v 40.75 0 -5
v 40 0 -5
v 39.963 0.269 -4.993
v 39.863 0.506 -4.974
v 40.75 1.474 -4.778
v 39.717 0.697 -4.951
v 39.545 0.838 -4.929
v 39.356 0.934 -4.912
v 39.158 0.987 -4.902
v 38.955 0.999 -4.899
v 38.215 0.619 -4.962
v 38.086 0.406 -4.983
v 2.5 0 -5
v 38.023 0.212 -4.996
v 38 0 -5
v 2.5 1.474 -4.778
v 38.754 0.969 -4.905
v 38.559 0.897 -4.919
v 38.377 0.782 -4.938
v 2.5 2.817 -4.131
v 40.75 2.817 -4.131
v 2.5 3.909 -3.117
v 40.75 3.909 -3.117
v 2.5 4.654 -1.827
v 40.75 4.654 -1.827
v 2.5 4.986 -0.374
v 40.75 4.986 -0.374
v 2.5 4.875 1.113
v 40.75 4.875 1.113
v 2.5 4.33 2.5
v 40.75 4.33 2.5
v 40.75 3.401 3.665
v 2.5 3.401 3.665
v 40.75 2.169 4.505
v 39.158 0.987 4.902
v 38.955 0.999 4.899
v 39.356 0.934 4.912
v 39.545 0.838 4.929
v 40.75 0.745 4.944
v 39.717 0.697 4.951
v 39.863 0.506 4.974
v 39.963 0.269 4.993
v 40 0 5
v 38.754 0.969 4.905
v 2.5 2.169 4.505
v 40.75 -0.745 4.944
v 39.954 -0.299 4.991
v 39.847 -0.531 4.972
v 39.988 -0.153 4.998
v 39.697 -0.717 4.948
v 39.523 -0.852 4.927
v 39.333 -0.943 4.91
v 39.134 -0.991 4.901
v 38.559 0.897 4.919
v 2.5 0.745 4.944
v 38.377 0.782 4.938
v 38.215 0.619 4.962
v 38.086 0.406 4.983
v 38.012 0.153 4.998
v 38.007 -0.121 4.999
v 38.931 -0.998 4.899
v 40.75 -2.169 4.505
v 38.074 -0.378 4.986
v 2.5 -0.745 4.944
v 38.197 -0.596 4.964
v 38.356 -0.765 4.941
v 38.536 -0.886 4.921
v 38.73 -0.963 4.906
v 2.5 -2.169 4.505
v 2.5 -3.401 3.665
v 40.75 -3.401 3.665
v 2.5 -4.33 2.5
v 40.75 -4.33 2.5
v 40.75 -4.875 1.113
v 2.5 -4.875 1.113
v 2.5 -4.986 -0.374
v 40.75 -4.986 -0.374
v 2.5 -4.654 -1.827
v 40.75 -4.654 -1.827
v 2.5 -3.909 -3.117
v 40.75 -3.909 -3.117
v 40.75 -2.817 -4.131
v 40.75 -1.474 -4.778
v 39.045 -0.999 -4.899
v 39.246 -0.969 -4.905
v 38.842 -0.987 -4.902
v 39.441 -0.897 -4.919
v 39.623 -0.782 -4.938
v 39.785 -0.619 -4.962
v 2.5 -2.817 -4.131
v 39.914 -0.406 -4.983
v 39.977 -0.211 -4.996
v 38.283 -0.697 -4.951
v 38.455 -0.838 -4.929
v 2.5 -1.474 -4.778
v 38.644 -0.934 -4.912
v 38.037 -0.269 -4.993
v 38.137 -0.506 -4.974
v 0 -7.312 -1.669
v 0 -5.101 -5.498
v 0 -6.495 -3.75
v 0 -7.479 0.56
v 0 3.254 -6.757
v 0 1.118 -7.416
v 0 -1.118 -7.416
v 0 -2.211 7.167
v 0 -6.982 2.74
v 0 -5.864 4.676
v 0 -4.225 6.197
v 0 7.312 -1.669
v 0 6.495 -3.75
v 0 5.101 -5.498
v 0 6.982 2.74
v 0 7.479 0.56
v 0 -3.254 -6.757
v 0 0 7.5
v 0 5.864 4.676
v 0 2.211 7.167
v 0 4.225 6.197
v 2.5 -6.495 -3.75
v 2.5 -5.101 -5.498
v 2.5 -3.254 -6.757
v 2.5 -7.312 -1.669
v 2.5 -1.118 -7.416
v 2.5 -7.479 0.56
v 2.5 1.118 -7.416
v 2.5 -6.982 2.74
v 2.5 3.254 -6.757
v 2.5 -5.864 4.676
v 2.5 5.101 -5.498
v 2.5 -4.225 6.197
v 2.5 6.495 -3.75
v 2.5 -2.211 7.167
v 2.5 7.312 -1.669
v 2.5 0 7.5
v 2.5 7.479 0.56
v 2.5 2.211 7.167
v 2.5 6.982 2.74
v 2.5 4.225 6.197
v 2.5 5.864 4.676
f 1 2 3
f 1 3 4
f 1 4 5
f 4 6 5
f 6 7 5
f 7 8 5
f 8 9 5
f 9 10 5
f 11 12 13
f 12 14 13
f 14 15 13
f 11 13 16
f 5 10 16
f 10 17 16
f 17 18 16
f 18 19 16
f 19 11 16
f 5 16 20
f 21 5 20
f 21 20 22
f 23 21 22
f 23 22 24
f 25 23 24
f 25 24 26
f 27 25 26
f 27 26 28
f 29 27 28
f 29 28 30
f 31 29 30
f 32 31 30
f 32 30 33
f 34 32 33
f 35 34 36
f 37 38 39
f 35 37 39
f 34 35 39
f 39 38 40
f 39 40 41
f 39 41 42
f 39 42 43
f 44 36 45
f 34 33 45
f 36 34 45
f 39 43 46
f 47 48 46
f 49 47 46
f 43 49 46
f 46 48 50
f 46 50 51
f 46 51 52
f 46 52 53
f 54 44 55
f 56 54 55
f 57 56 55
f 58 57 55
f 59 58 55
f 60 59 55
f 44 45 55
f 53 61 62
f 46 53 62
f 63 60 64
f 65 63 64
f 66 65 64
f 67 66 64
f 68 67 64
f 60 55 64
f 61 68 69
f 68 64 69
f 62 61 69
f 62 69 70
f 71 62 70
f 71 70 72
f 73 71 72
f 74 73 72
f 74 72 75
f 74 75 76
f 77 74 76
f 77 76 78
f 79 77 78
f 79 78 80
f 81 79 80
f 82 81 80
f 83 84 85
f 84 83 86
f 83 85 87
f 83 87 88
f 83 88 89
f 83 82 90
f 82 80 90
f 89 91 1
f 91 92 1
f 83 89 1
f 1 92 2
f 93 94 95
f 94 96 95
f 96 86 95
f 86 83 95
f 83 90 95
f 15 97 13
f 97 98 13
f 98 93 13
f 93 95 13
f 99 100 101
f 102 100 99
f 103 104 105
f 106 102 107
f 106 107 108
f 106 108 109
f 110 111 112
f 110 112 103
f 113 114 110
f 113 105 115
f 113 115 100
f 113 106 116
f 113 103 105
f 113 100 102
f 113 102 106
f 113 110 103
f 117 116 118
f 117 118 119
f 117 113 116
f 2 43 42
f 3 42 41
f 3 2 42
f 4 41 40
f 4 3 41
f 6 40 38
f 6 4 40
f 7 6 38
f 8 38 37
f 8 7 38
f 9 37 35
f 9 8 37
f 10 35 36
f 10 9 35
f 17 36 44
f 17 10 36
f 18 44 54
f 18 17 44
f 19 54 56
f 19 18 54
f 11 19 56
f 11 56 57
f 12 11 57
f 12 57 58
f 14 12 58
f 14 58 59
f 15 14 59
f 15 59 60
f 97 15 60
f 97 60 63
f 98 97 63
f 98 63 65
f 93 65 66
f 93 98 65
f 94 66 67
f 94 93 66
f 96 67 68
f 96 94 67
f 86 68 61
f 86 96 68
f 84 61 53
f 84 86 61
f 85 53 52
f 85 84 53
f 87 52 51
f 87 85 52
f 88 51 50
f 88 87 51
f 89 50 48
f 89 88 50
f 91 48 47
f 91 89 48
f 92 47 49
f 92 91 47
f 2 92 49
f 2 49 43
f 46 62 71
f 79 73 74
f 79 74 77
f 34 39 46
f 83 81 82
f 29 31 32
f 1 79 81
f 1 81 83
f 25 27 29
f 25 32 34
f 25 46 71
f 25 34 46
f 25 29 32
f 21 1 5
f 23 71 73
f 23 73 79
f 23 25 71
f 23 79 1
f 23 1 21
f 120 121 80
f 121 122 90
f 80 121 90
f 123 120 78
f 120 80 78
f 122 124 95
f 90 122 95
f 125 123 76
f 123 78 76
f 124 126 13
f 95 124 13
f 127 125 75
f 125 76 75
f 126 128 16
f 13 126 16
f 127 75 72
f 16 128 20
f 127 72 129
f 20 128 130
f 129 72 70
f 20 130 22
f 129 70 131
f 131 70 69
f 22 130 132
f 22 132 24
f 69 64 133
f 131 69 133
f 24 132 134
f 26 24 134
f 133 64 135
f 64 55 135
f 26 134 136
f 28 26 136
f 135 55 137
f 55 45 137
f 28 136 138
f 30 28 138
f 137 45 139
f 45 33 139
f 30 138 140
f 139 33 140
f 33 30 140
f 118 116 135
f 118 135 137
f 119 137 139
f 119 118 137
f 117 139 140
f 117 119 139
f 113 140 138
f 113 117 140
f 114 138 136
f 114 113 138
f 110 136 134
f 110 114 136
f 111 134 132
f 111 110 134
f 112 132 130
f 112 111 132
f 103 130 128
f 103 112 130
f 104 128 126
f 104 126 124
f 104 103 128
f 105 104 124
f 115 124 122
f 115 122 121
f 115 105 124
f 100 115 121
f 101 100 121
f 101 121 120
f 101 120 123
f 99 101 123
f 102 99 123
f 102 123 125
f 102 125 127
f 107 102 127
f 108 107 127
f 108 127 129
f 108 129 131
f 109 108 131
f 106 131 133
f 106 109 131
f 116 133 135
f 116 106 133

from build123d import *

# Parameters (mm, degrees)
SKETCH1_R               = 10
BOSS_EXTRUDE1_DEPTH     = 81.5
CUT_EXTRUDE1_DEPTH      = 25
CUT_EXTRUDE1_DEPTH_BACK = 19
SKETCH3_R               = 2
SKETCH4_R               = 15
BOSS_EXTRUDE2_DEPTH     = 5
SCALE1_SCALE            = 0.5


with BuildPart() as part:
    # Sketch1 → Boss-Extrude1 (new body)
    with BuildSketch(Plane(origin=(0, 0, 0), x_dir=(0, 0, -1), z_dir=(1, 0, 0))):
        Circle(SKETCH1_R)
    extrude(amount=BOSS_EXTRUDE1_DEPTH)

    # Sketch3 → Cut-Extrude1 (cut, two sides: drawn at the far end of the back side and taken through both)
    with BuildSketch(Plane.XY.offset(-CUT_EXTRUDE1_DEPTH_BACK)):
        with Locations((78, 0)):
            Circle(SKETCH3_R)
    extrude(amount=CUT_EXTRUDE1_DEPTH + CUT_EXTRUDE1_DEPTH_BACK, mode=Mode.SUBTRACT)

    # Sketch4 → Boss-Extrude2 (add)
    with BuildSketch(Plane.ZY):
        Circle(SKETCH4_R)
    extrude(amount=-BOSS_EXTRUDE2_DEPTH)


with BuildPart() as part_1:
    # Scale1: scaled about (0, 0, 0)
    add(part.part.scale(SCALE1_SCALE))


solid = part_1.part
